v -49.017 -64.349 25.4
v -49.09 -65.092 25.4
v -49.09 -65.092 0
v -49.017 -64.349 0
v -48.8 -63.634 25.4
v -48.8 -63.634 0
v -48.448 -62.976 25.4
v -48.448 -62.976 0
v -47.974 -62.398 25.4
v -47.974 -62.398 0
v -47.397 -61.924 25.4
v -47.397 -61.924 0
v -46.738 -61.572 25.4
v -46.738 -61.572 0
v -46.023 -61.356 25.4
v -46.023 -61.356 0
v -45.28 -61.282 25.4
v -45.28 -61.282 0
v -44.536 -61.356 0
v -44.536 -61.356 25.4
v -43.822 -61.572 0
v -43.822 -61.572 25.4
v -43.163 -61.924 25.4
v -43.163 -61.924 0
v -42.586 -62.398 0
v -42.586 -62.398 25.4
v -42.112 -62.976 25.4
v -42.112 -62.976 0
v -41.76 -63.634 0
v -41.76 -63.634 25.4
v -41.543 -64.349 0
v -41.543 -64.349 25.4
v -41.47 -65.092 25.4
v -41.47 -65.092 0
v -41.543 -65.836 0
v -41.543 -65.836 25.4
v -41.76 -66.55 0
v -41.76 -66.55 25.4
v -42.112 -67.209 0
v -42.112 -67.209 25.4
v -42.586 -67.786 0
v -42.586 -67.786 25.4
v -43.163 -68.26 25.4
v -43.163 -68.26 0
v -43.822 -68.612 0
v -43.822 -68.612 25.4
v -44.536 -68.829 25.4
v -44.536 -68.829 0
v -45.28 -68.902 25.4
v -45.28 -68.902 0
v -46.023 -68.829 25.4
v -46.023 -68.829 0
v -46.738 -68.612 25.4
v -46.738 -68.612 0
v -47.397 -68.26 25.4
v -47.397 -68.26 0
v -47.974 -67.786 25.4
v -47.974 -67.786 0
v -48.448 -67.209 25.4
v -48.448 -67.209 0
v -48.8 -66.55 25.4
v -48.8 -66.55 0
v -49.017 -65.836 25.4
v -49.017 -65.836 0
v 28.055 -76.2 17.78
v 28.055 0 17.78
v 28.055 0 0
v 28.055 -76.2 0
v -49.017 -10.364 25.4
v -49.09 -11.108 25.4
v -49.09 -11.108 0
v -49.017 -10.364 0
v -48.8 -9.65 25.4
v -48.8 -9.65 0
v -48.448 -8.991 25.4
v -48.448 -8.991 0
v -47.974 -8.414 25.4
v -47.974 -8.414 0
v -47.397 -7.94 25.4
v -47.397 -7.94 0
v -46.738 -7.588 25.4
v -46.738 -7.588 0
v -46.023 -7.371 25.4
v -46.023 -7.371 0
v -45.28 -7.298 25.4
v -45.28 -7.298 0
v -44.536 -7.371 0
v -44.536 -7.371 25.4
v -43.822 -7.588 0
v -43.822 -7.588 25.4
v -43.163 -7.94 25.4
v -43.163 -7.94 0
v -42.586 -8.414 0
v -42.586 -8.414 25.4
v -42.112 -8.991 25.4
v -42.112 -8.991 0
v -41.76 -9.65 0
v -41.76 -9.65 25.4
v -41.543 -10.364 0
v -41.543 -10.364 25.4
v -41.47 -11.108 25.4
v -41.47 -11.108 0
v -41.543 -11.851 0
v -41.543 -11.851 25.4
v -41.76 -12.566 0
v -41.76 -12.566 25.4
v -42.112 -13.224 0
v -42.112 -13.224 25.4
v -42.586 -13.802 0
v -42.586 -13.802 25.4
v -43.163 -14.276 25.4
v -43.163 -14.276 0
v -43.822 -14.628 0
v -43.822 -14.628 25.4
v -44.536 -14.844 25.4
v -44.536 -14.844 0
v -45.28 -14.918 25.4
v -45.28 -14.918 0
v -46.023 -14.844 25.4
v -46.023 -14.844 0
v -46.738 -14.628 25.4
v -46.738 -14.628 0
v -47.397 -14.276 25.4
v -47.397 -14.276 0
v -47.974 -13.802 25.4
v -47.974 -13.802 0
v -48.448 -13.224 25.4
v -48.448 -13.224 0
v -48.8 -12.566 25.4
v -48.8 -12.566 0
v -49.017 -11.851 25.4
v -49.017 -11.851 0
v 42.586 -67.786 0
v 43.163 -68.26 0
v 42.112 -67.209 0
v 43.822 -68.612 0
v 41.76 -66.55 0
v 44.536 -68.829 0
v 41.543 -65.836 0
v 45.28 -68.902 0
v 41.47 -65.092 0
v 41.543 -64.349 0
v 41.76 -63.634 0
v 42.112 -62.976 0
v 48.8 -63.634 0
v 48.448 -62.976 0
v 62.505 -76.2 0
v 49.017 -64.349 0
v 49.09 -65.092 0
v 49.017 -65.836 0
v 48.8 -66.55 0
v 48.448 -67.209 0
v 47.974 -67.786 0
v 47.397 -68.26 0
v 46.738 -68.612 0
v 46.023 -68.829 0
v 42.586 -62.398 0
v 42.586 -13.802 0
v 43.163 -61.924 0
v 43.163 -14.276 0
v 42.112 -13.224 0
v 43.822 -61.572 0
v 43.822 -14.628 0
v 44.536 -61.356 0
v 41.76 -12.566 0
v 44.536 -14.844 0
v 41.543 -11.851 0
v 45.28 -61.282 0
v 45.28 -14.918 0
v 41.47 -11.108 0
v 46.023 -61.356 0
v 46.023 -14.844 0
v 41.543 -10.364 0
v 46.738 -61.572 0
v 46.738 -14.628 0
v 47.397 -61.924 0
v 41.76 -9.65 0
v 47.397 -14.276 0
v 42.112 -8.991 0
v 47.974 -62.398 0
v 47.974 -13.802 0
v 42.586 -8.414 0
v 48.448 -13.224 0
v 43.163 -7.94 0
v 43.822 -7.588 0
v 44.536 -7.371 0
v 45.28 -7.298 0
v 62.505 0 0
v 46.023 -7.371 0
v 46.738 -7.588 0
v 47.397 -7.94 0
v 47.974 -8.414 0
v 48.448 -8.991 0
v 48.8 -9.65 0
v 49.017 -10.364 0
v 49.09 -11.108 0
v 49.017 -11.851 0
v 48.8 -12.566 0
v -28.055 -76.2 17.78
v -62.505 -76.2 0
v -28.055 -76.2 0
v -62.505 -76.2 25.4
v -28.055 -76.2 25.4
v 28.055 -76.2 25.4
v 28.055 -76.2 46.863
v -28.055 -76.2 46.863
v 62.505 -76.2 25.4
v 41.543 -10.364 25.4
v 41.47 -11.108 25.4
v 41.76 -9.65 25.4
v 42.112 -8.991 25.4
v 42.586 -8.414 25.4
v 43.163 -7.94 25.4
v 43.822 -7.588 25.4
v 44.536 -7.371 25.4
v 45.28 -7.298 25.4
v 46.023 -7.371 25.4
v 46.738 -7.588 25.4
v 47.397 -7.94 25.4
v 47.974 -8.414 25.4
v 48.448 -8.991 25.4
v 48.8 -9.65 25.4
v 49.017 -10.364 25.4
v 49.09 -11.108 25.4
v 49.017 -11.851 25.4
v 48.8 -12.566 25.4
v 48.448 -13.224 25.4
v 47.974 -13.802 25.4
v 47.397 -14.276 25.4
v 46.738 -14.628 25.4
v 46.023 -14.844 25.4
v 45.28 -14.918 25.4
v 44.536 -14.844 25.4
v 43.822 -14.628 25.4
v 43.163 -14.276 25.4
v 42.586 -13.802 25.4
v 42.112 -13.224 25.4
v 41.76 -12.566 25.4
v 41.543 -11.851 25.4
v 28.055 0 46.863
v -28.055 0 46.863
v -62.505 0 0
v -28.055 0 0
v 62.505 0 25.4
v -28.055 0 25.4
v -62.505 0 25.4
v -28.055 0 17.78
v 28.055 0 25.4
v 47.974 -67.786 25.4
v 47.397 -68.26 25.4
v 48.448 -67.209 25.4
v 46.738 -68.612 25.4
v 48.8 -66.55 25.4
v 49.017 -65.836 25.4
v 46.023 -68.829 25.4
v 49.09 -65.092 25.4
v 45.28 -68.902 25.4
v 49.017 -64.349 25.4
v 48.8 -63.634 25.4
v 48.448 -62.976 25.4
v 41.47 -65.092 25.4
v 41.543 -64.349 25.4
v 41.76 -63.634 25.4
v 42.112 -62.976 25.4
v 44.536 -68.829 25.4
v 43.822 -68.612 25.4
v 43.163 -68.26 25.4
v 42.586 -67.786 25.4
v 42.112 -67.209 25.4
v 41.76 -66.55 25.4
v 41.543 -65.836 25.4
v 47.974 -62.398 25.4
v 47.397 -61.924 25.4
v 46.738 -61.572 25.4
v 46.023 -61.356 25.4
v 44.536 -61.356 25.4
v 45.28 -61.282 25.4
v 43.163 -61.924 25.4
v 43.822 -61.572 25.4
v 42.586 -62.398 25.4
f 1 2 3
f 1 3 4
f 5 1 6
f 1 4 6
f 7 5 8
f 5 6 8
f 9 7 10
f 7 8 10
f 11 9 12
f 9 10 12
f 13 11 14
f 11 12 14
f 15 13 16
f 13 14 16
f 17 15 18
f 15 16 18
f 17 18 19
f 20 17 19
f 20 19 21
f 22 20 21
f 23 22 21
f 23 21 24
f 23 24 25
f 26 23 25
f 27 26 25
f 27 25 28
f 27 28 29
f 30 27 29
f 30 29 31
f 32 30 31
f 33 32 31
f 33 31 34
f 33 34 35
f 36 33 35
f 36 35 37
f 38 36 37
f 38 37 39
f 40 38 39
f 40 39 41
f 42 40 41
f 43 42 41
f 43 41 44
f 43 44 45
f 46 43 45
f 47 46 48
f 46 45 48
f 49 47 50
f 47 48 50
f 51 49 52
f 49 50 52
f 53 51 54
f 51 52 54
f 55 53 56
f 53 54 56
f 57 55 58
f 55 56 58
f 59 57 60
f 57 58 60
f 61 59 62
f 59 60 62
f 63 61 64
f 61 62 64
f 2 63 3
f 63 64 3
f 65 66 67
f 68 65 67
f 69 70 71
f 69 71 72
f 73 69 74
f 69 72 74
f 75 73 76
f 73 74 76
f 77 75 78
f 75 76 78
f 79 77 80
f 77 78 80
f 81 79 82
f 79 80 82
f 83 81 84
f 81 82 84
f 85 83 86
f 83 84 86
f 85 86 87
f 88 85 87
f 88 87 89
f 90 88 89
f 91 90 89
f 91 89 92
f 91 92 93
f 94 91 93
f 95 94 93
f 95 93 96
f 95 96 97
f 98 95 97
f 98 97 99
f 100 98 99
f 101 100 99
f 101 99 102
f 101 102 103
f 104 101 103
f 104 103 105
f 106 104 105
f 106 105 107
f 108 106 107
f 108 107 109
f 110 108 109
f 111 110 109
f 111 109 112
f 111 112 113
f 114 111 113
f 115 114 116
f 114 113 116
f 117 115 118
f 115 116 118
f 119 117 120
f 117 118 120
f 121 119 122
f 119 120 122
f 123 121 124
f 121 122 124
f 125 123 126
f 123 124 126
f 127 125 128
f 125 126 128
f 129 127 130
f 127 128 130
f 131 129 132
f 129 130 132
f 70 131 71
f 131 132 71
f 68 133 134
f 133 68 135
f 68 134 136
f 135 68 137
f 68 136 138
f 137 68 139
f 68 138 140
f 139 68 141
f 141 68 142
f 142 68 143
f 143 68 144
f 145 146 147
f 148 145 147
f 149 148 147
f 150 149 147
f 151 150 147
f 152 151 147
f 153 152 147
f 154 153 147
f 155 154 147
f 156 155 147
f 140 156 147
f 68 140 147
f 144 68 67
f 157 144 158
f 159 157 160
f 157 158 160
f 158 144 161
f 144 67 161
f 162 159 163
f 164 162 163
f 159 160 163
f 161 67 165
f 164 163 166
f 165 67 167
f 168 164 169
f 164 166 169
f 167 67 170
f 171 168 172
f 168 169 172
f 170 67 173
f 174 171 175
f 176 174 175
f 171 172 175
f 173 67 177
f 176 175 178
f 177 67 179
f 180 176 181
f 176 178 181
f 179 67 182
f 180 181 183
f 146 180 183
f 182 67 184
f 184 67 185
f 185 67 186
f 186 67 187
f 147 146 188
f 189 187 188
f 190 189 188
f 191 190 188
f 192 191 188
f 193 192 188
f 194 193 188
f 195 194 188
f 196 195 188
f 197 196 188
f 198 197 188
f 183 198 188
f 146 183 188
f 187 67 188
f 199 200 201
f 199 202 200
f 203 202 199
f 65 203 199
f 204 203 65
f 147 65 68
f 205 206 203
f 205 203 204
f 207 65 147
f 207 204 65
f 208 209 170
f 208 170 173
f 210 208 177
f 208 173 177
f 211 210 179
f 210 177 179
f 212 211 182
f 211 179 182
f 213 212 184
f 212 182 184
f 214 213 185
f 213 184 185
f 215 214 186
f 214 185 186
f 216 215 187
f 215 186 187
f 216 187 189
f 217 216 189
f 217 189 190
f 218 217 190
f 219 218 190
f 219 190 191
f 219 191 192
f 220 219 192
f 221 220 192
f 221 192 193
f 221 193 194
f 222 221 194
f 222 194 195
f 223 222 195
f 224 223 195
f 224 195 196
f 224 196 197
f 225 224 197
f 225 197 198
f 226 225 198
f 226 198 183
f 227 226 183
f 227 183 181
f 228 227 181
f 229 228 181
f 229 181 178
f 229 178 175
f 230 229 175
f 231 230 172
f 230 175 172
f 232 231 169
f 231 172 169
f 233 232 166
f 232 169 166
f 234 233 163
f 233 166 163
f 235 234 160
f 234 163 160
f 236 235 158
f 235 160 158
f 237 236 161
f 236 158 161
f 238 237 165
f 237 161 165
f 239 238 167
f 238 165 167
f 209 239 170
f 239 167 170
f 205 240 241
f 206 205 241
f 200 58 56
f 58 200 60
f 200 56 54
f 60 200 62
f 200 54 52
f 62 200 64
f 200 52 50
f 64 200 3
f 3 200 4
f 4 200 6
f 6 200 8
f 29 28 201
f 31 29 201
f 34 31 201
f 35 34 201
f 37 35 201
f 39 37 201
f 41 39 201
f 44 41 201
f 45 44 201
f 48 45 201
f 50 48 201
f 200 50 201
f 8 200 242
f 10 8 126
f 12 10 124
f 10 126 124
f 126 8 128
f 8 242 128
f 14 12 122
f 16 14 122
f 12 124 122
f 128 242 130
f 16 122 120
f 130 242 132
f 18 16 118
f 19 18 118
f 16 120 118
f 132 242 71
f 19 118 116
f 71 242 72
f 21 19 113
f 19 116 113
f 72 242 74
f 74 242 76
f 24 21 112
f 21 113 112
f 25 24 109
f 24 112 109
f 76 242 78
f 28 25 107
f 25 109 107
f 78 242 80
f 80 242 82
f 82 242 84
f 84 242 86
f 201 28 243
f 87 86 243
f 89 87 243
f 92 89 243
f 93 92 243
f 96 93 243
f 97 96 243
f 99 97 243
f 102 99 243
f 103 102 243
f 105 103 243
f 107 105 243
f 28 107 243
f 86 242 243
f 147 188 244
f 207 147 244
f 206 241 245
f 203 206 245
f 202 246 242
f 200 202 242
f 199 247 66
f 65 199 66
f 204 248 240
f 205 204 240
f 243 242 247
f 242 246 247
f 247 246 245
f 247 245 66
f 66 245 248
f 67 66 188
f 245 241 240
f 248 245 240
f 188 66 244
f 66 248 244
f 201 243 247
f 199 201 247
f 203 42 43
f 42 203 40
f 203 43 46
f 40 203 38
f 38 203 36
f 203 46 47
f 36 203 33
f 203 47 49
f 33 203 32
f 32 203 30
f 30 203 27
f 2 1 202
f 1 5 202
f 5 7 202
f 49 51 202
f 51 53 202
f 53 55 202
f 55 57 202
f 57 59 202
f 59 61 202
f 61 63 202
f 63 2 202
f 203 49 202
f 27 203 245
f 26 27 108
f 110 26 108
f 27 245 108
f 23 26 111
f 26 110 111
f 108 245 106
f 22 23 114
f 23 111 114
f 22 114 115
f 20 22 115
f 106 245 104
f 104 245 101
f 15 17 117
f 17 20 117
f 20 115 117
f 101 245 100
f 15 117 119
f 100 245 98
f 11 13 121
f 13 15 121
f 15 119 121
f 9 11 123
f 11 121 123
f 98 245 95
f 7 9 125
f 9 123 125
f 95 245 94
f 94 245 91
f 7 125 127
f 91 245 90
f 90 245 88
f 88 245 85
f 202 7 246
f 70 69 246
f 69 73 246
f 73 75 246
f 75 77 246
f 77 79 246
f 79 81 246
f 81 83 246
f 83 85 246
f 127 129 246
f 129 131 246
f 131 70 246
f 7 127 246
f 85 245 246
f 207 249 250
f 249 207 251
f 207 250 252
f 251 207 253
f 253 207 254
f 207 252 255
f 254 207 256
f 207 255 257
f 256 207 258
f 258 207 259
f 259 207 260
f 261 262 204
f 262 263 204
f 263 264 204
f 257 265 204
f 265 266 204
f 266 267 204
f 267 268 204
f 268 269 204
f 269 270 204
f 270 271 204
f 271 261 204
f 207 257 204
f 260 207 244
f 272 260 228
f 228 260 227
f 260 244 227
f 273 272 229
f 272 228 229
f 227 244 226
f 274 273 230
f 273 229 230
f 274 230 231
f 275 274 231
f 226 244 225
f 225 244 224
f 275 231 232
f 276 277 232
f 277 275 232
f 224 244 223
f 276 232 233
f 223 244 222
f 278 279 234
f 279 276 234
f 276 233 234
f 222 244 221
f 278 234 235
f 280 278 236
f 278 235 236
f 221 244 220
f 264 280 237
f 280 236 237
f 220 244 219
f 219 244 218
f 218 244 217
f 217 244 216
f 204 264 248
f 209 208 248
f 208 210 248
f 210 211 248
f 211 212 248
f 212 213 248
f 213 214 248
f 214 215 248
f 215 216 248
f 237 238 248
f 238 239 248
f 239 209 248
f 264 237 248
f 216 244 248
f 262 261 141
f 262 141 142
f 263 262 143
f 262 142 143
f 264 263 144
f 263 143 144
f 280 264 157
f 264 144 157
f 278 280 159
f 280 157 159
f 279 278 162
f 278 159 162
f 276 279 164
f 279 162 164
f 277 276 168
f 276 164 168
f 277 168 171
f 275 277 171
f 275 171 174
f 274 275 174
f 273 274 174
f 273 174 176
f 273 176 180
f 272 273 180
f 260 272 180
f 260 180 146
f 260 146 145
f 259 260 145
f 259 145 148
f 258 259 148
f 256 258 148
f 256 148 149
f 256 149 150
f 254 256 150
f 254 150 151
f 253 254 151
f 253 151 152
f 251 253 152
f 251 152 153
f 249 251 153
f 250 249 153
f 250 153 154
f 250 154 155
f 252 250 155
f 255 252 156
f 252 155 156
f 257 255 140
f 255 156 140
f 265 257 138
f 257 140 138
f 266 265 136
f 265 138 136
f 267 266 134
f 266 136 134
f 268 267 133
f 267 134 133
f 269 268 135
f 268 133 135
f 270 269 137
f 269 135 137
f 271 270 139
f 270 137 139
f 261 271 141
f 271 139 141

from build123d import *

# Parameters (mm, degrees)
F1_DEPTH = 76.2
F3_D     = 7.62
F5_D     = 7.62


with BuildPart() as f1:
    # F0 (on Front) → F1 (new body)
    with BuildSketch(Plane.XZ):
        Polygon((-62.504791, 0), (-28.054785, 0), (-28.054785, 17.78), (28.054785, 17.78), (28.054785, 0), (62.504791, 0), (62.504791, 25.4), (28.054785, 25.4), (28.054785, 46.863), (0, 46.863), (-28.054785, 46.863), (-28.054785, 25.4), (-62.504791, 25.4), align=None)
    extrude(amount=F1_DEPTH)

    # F3 (through all)
    with Locations(Plane.XY.offset(25.4)):
        with Locations((-45.279788, -11.107678), (-45.279788, -65.092322)):
            Hole(F3_D / 2)

    # F5 (through all)
    with Locations(Plane.XY.offset(25.4)):
        with Locations((45.279788, -11.107678), (45.279788, -65.092322)):
            Hole(F5_D / 2)


solid = f1.part
